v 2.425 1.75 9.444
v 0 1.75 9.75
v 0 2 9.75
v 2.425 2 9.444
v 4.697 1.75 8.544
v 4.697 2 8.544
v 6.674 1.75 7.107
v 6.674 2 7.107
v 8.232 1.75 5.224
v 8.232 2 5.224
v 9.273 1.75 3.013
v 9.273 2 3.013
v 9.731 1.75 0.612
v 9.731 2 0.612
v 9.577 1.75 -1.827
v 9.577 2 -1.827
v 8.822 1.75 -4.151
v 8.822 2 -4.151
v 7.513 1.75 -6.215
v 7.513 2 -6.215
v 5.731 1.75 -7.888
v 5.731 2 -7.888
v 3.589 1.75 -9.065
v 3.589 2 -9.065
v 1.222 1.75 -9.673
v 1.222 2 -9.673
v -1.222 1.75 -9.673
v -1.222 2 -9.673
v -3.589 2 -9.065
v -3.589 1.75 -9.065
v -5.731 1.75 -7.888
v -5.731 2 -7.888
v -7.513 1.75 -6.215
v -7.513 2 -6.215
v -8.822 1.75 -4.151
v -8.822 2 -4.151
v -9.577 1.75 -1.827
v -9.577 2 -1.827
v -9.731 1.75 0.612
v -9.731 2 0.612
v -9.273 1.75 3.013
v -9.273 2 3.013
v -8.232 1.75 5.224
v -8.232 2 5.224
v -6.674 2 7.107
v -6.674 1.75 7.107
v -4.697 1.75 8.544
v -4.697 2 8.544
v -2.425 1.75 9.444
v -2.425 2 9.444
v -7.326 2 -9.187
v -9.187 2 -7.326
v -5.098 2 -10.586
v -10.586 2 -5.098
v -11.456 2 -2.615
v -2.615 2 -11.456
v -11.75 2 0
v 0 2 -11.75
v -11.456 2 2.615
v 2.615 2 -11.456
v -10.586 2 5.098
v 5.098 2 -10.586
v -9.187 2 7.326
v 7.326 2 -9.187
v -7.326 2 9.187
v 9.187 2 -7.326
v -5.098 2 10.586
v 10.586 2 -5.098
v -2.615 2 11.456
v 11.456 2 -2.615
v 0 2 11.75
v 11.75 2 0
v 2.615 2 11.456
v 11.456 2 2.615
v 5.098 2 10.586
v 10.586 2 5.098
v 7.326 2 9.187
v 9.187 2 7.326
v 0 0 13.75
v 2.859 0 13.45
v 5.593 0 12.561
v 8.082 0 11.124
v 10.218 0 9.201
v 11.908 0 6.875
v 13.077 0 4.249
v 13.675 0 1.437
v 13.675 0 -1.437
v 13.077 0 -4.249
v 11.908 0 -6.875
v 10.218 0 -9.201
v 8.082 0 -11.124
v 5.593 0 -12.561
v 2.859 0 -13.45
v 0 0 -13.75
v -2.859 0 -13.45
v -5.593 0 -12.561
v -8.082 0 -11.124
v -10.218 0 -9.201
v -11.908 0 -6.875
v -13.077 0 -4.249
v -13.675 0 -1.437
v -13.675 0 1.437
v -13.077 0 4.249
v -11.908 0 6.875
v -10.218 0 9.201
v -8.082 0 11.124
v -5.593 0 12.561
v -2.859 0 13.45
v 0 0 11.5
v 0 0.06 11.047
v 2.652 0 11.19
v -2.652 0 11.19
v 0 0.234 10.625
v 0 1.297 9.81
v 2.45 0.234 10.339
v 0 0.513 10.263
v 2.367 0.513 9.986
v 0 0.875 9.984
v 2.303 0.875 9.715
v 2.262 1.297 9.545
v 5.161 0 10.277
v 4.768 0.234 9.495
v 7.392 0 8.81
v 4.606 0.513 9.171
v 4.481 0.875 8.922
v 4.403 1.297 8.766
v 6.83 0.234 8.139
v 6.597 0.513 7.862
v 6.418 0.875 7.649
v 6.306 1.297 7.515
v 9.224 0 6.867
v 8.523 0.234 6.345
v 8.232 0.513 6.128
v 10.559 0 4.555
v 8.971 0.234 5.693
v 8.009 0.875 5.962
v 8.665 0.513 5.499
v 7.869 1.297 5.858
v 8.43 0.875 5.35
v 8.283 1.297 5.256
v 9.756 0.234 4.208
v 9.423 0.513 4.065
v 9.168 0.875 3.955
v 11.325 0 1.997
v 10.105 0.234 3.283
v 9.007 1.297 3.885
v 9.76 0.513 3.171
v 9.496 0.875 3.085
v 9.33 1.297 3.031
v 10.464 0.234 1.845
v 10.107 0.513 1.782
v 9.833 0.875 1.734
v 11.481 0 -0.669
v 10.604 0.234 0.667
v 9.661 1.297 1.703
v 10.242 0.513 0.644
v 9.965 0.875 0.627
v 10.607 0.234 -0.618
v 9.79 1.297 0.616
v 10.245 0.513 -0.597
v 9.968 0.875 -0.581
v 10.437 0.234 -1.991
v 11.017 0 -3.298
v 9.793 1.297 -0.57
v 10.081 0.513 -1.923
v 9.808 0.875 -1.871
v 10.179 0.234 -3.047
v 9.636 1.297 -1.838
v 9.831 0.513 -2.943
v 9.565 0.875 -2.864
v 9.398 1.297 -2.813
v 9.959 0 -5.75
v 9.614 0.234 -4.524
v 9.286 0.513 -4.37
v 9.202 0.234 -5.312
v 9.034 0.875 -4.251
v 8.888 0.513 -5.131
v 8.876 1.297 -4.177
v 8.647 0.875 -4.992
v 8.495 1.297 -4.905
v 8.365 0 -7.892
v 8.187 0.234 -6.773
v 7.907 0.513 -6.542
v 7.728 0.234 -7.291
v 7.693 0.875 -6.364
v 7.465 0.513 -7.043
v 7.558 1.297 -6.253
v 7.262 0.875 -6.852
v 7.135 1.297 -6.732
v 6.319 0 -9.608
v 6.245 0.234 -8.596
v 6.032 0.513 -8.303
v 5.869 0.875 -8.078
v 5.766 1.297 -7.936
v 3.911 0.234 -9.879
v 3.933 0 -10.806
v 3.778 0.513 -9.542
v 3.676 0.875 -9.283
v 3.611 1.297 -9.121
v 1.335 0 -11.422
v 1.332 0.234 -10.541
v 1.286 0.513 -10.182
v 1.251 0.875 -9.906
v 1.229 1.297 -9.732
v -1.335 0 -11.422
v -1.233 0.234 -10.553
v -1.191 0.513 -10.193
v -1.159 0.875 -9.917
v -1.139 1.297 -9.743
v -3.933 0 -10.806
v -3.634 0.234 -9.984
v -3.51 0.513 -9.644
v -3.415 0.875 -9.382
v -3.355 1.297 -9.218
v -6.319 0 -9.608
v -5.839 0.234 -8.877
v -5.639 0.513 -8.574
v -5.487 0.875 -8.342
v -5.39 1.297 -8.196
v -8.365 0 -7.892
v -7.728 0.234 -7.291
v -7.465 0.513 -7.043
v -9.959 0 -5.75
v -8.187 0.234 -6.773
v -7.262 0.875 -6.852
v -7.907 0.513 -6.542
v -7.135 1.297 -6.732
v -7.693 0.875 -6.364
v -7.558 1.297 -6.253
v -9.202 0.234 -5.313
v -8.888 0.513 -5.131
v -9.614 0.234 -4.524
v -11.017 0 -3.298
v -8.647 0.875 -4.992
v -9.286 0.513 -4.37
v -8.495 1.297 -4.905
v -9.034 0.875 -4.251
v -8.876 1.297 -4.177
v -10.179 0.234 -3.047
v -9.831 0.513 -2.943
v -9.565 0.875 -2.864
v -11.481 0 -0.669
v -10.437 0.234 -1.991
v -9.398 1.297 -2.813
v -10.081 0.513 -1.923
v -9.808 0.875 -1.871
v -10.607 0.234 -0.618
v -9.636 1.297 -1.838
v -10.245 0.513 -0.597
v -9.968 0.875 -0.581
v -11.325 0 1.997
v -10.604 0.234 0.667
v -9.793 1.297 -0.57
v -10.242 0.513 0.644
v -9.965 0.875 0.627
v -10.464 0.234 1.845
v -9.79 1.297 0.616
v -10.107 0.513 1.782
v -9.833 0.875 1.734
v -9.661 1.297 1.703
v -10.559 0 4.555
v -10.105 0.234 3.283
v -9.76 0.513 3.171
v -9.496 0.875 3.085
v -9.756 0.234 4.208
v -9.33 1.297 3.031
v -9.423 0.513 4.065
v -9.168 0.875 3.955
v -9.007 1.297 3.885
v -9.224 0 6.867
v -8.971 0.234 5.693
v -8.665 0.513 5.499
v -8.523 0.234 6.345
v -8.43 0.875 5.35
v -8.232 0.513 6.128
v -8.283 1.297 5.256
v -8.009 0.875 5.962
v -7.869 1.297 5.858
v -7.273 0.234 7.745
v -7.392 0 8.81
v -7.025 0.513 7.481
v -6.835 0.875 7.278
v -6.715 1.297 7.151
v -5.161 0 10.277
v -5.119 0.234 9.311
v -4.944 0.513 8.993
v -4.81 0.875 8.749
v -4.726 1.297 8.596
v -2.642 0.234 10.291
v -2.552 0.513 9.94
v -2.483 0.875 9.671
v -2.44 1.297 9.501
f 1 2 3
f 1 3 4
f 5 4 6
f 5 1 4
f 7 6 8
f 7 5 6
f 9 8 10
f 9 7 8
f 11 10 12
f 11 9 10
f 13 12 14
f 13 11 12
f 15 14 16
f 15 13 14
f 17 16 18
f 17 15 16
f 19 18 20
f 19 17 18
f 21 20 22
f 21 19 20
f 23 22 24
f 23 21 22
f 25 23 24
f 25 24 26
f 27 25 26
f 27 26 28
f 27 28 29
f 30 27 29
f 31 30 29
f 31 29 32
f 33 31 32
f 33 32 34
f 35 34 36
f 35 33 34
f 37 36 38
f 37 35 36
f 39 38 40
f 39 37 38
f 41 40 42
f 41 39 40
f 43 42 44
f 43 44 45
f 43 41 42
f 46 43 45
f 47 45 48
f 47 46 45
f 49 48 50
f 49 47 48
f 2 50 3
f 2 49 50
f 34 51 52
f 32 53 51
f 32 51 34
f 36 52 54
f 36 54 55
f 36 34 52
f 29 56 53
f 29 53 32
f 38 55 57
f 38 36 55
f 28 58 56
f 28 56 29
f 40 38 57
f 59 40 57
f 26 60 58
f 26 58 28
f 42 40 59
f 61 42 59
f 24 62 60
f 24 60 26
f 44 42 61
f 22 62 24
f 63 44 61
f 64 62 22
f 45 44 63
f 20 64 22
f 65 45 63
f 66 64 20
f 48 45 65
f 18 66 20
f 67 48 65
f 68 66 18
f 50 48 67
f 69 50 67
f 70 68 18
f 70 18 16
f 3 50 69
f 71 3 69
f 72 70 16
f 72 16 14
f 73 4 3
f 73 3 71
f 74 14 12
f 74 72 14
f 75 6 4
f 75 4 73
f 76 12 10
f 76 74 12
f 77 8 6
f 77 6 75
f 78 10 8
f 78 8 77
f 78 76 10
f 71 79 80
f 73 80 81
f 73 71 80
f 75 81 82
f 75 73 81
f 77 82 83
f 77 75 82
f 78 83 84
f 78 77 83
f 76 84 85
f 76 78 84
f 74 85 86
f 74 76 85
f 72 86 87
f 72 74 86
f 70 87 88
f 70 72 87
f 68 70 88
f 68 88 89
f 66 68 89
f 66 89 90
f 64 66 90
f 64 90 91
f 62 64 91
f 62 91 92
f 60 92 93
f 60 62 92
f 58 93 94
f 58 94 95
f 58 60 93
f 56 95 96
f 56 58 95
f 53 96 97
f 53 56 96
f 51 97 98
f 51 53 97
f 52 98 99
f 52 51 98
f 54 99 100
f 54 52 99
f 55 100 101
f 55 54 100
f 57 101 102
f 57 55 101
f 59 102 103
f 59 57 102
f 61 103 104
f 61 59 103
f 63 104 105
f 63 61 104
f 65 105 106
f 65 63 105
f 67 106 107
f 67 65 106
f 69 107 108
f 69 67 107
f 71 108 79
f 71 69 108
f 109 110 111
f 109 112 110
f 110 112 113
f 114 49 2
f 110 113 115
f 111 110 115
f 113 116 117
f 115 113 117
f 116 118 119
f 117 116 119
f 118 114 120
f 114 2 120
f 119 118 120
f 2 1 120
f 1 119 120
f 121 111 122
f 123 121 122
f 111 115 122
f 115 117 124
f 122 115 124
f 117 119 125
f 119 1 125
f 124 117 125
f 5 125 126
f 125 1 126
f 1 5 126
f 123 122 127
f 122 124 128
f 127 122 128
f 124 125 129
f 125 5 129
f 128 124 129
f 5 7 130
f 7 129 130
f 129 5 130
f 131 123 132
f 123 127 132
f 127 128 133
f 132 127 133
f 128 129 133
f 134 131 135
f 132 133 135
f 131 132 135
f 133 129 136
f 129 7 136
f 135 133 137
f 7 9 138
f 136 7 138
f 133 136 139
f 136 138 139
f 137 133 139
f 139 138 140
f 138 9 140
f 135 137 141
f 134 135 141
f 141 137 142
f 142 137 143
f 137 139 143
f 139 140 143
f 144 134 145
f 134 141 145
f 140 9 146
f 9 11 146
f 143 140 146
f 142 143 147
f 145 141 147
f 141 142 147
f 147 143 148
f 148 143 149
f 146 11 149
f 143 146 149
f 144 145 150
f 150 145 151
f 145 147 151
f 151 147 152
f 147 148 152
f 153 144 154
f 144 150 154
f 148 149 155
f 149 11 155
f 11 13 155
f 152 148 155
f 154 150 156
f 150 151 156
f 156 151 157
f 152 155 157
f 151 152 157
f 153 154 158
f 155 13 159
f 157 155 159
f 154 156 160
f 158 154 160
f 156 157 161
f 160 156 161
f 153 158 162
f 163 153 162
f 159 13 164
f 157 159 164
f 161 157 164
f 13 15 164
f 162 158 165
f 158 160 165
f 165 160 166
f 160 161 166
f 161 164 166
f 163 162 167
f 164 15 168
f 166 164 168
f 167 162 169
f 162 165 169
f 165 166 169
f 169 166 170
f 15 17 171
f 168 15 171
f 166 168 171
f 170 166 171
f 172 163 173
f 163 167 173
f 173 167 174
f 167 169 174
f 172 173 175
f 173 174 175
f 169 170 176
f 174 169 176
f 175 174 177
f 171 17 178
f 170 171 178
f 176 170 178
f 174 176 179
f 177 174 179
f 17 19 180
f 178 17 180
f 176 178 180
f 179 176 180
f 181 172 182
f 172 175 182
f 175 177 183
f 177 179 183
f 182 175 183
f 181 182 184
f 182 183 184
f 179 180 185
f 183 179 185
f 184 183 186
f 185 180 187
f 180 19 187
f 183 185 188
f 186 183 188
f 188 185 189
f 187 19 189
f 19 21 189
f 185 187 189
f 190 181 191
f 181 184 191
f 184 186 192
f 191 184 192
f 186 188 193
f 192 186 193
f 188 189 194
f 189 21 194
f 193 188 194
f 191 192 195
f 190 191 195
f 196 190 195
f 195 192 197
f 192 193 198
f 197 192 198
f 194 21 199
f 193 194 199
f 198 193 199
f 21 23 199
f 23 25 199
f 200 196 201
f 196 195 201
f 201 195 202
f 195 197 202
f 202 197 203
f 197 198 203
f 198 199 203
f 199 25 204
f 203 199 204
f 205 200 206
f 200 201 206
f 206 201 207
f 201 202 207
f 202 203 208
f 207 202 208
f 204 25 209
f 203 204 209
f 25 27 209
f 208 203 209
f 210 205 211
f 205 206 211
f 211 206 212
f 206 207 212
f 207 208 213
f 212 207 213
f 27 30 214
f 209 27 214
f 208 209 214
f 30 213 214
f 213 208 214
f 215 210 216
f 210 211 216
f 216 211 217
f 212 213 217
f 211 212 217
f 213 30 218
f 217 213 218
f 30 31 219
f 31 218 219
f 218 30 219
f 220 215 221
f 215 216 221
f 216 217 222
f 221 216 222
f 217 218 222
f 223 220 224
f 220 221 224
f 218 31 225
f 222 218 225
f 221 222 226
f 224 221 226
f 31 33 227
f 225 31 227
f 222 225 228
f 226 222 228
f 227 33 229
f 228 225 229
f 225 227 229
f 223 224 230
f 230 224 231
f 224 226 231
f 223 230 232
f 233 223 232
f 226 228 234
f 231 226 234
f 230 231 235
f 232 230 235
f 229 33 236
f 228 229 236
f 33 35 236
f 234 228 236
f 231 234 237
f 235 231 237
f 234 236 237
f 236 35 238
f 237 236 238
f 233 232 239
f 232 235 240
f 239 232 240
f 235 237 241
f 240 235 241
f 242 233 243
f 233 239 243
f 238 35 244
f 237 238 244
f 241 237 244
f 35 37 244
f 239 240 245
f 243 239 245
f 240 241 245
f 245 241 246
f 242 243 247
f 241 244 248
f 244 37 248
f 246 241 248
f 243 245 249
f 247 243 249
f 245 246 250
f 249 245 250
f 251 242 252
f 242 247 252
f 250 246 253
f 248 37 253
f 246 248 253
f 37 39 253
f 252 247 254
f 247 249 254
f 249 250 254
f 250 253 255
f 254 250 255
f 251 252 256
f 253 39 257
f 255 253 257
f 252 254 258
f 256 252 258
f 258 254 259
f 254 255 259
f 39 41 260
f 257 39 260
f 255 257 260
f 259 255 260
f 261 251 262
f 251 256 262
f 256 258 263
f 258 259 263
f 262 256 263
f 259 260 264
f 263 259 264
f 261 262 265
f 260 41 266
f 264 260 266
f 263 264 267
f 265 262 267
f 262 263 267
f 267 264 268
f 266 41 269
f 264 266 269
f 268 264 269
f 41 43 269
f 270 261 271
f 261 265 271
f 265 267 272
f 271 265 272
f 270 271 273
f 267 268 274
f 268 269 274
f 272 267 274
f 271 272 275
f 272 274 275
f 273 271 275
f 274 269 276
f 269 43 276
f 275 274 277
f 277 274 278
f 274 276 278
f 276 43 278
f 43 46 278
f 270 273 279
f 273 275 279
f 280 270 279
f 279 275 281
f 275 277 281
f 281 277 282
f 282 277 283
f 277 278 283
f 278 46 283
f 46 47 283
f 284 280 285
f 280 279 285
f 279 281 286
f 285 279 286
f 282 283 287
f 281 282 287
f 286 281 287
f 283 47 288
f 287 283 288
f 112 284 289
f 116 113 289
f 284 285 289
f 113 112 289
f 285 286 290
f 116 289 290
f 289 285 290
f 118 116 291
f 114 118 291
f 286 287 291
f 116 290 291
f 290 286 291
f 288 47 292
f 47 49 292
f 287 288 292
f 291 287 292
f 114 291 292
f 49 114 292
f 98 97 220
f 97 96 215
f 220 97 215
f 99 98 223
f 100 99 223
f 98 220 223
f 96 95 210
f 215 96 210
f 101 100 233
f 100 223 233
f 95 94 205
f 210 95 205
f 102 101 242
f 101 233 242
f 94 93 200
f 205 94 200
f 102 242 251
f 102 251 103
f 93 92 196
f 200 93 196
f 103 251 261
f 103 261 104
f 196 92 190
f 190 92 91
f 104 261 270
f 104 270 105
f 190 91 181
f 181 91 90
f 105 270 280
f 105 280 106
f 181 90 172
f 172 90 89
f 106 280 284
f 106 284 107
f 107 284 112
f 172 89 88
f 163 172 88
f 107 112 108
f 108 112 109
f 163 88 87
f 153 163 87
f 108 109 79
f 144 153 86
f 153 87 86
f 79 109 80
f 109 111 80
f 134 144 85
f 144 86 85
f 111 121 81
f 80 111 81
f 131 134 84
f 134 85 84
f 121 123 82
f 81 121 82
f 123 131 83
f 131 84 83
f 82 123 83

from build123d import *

# Parameters (mm, degrees)
SKETCH1_R           = 13.75
SKETCH1_R_2         = 9.75
BOSS_EXTRUDE1_DEPTH = 2
CHAMFER1_SIZE       = 2
FILLET1_R           = 1.75


with BuildPart() as part:
    # Sketch1 → Boss-Extrude1 (new body)
    with BuildSketch(Plane(origin=(0, 0, 0), x_dir=(1, 0, 0), z_dir=(0, 1, 0))):
        with Locations(Location((0, 0, 0), (0, 0, 270))):
            Circle(SKETCH1_R)
        with Locations(Location((0, 0, 0), (0, 0, 270))):
            Circle(SKETCH1_R_2, mode=Mode.SUBTRACT)
    extrude(amount=BOSS_EXTRUDE1_DEPTH)

    # Chamfer1
    chamfer1_edges = [part.edges().sort_by_distance(p)[0] for p in [
        (0, 2, -13.75),
    ]]
    chamfer(chamfer1_edges, length=CHAMFER1_SIZE - 0.0001)  # a hair under: the kernel refuses the full size

    # Fillet1
    fillet1_edges = [part.edges().sort_by_distance(p)[0] for p in [
        (0, 0, -9.75),
    ]]
    fillet(fillet1_edges, radius=FILLET1_R)


solid = part.part
